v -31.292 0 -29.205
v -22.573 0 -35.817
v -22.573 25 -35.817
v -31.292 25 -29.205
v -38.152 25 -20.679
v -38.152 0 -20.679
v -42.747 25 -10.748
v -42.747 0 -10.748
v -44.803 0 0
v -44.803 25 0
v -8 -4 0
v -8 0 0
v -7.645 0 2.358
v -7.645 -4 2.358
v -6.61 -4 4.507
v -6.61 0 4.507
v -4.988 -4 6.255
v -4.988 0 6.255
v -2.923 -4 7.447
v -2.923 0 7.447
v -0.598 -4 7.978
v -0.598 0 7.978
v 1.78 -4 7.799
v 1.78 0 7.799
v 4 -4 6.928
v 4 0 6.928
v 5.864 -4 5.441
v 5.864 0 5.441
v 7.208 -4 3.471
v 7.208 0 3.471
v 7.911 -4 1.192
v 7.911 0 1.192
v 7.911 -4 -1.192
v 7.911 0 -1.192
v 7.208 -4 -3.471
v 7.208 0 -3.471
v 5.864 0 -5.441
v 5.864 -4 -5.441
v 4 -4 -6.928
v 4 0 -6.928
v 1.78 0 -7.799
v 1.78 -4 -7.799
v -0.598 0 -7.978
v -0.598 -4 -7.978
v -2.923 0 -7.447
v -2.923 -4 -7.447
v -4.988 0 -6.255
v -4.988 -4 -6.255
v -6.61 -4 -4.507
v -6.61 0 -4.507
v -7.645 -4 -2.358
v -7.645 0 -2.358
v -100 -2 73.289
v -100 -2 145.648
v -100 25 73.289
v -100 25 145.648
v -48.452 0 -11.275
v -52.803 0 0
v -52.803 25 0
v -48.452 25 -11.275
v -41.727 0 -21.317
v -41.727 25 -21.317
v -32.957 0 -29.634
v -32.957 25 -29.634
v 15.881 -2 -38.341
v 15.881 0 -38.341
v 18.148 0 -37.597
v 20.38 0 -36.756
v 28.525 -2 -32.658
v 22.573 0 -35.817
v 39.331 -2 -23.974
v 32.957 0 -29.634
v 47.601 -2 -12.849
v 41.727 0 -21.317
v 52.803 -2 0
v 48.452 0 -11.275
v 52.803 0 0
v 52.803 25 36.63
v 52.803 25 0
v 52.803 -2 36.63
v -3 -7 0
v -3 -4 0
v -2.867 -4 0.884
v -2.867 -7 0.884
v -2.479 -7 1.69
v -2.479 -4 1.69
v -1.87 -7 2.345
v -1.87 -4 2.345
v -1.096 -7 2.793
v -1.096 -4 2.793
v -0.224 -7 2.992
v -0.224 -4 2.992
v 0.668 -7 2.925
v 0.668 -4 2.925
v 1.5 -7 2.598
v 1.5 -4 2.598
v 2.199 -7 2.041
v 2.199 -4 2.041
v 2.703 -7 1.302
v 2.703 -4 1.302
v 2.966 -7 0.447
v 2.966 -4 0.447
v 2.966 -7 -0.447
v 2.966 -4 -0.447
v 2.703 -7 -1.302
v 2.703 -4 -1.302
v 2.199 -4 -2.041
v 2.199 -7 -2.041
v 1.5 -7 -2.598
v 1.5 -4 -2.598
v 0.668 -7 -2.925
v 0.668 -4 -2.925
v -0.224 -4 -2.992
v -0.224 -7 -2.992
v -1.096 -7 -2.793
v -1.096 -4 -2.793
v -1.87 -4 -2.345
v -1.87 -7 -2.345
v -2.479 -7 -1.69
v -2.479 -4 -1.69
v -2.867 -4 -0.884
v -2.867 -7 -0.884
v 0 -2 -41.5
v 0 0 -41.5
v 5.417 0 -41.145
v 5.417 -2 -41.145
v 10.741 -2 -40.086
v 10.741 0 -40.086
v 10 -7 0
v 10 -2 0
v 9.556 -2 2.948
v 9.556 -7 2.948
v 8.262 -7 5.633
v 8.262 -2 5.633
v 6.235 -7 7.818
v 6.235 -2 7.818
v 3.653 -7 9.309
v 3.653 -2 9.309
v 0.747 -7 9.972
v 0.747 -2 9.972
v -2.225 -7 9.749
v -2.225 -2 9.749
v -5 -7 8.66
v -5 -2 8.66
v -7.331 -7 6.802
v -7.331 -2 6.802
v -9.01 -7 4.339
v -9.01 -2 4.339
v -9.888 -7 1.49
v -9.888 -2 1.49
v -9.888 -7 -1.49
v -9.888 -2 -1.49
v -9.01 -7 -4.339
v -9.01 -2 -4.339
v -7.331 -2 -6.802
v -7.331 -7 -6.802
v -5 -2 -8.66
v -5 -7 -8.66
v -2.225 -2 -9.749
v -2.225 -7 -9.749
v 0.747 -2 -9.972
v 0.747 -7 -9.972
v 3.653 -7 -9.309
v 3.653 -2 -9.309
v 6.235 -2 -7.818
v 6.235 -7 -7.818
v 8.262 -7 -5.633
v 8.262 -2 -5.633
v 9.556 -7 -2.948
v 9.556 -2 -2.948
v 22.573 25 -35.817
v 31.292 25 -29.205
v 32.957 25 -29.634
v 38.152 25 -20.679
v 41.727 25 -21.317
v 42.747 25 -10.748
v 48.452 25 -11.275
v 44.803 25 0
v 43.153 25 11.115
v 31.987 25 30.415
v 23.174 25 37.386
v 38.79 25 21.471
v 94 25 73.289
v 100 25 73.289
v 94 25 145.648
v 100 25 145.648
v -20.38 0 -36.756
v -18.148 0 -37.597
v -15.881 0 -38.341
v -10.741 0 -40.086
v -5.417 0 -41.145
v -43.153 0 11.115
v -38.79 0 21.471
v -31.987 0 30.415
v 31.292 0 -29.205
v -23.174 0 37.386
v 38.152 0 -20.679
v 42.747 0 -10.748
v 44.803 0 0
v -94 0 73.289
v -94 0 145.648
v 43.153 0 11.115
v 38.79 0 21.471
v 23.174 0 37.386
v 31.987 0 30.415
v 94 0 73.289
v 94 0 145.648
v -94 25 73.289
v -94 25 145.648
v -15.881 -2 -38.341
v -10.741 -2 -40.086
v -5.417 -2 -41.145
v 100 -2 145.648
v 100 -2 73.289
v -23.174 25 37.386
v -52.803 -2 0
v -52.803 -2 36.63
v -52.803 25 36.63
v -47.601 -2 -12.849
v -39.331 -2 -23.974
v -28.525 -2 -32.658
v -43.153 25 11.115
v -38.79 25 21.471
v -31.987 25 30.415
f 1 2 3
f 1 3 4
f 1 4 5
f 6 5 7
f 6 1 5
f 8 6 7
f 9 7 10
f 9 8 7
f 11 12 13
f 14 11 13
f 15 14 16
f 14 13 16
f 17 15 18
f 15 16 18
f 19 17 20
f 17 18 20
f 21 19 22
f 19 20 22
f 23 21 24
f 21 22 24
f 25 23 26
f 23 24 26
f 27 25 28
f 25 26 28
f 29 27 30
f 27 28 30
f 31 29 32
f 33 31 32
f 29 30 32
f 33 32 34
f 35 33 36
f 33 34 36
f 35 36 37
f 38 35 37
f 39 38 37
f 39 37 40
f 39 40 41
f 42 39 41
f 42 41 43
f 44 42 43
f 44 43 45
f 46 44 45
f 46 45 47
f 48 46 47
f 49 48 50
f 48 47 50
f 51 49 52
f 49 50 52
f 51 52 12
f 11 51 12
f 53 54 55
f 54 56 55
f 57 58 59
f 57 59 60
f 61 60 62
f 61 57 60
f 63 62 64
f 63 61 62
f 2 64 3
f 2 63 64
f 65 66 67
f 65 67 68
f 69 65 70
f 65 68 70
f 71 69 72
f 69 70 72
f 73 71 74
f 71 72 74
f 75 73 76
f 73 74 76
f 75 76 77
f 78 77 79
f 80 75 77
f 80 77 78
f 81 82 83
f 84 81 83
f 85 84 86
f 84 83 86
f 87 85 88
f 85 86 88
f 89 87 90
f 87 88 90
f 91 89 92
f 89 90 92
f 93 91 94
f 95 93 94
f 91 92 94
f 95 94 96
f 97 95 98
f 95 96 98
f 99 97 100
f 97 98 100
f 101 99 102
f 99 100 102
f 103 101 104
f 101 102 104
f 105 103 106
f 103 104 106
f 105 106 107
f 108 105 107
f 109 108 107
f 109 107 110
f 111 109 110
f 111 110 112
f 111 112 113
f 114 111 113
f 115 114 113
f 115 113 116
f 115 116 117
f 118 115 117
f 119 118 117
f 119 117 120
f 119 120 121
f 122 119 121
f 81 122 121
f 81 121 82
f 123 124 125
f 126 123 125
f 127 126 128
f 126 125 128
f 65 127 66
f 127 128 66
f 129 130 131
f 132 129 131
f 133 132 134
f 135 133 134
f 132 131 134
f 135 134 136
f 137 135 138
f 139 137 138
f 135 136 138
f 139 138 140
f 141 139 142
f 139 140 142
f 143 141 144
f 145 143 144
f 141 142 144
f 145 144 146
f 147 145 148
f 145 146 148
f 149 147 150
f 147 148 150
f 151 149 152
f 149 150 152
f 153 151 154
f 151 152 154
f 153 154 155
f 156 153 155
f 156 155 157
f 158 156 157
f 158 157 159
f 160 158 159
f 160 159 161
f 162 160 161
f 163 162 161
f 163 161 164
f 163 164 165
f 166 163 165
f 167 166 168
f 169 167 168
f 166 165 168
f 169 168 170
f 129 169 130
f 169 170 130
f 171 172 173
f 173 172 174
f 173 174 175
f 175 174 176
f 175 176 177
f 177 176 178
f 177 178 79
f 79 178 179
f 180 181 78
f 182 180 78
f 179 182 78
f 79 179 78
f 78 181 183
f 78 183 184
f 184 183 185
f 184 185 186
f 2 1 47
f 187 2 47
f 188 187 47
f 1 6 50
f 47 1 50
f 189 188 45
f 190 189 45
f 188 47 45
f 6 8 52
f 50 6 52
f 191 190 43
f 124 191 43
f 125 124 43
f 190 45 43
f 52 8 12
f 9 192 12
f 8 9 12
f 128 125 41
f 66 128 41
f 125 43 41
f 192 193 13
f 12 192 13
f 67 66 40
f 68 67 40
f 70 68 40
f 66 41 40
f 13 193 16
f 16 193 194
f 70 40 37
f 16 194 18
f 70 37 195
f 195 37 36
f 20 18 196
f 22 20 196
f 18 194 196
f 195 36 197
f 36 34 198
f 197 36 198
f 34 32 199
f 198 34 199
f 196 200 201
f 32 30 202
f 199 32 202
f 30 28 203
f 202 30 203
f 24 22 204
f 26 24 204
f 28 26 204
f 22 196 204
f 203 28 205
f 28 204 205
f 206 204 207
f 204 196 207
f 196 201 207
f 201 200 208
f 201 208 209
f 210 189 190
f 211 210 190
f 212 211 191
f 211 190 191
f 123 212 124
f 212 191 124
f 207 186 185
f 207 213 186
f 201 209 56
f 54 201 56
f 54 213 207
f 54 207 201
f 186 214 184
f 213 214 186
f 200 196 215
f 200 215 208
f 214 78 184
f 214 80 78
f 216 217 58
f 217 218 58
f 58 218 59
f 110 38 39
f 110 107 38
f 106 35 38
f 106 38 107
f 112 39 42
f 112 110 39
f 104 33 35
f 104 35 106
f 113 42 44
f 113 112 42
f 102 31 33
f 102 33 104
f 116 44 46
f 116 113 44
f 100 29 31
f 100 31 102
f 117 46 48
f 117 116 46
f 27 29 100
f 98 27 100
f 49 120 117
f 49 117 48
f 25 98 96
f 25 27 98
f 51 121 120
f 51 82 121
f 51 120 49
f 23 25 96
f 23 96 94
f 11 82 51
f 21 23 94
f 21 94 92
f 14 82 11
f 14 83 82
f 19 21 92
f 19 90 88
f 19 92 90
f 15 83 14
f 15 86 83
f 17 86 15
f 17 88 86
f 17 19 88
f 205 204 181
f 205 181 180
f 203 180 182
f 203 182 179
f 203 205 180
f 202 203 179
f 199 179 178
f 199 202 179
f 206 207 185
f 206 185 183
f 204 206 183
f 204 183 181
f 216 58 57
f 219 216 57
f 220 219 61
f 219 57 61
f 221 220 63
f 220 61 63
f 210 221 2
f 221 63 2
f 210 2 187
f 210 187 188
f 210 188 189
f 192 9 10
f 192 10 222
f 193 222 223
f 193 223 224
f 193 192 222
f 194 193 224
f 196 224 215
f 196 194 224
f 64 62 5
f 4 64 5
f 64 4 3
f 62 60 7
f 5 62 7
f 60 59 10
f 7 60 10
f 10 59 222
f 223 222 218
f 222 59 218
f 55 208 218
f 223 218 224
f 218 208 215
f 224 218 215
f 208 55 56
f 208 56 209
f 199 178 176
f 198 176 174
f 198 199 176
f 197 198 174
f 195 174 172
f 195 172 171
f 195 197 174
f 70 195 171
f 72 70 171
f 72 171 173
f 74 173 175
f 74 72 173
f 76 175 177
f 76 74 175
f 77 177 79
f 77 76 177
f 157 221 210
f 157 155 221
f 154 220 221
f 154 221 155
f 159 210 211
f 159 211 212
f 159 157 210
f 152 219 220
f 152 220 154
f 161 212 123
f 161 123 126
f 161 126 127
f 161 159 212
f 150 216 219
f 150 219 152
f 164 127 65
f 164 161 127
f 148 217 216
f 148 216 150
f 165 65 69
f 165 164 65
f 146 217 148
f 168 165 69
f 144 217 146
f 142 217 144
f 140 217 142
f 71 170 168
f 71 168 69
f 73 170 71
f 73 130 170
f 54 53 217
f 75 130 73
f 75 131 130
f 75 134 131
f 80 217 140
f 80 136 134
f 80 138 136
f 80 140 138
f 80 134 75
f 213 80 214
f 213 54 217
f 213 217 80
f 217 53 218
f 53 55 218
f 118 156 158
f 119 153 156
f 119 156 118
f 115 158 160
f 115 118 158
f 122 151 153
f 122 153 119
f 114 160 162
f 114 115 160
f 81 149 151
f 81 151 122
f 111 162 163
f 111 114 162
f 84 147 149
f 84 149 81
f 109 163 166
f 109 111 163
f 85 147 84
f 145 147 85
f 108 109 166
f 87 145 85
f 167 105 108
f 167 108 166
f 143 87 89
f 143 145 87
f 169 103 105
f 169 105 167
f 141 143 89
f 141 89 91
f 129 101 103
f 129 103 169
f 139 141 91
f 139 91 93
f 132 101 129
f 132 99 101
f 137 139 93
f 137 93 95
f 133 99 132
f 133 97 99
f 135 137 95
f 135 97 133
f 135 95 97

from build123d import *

# Parameters (mm, degrees)
F1_DEPTH  = 2
F2_R      = 10
F3_DEPTH  = 5
F4_R      = 8
F5_DEPTH  = 4
F6_R      = 3
F7_DEPTH  = 25
F9_DEPTH  = 25
F11_DEPTH = 25
F12_DEPTH = 25


# Not quite as in the source:
# - a feature names something its author has since deleted; it is built from what else it names


with BuildPart() as f1:
    # F0 (on Front) → F1 (new body)
    with BuildSketch(Plane.XZ):
        with BuildLine():
            Line((0, 0), (15.8813624432, -38.3410005992))
            ThreePointArc((15.8813624432, -38.3410005992), (41.5, 0), (15.8813624432, 38.3410005992))
            Line((15.8813624432, 38.3410005992), (0, 0))
        make_face()
        with BuildLine():
            ThreePointArc((0, -41.5), (8.0962483637, -40.7025891367), (15.8813624432, -38.3410005992))
            Line((15.8813624432, -38.3410005992), (0, 0))
            Line((0, 0), (0, -41.5))
        make_face()
        with BuildLine():
            ThreePointArc((15.8813624432, 38.3410005992), (41.5, 0), (15.8813624432, -38.3410005992))
            ThreePointArc((15.8813624432, -38.3410005992), (39.330613444, -23.9742260076), (52.803106606, 0))
            Line((52.803106606, 0), (52.803106606, 36.6300418973))
            Line((52.803106606, 36.6300418973), (100, 73.2887908816))
            Line((100, 73.2887908816), (100, 145.6475704908))
            Line((100, 145.6475704908), (0, 145.6475704908))
            Line((0, 145.6475704908), (-100, 145.6475704908))
            Line((-100, 145.6475704908), (-100, 73.2887908816))
            Line((-100, 73.2887908816), (-52.803106606, 36.6300418973))
            Line((-52.803106606, 36.6300418973), (-52.803106606, 0))
            ThreePointArc((-52.803106606, 0), (-39.330613444, -23.9742260076), (-15.8813624432, -38.3410005992))
            ThreePointArc((-15.8813624432, -38.3410005992), (-41.5, 0), (-15.8813624432, 38.3410005992))
            ThreePointArc((-15.8813624432, 38.3410005992), (0, 41.5), (15.8813624432, 38.3410005992))
        make_face()
        with BuildLine():
            Line((0, -41.5), (0, 0))
            Line((0, 0), (-15.8813624432, -38.3410005992))
            ThreePointArc((-15.8813624432, -38.3410005992), (-8.0962483637, -40.7025891367), (0, -41.5))
        make_face()
        with BuildLine():
            Line((-15.8813624432, -38.3410005992), (0, 0))
            Line((0, 0), (-15.8813624432, 38.3410005992))
            ThreePointArc((-15.8813624432, 38.3410005992), (-41.5, 0), (-15.8813624432, -38.3410005992))
        make_face()
        with BuildLine():
            Line((0, 0), (15.8813624432, 38.3410005992))
            ThreePointArc((15.8813624432, 38.3410005992), (0, 41.5), (-15.8813624432, 38.3410005992))
            Line((-15.8813624432, 38.3410005992), (0, 0))
        make_face()
    extrude(amount=F1_DEPTH)

    # F2 (on face) → F3 (join)
    with BuildSketch(Plane.XZ.offset(2)):
        Circle(F2_R)
    extrude(amount=F3_DEPTH)

    # F4 (on face) → F5 (cut)
    with BuildSketch(Plane(origin=(0, 0, 0), x_dir=(-1, 0, 0), z_dir=(0, 1, 0))):
        Circle(F4_R)
    extrude(amount=-F5_DEPTH, mode=Mode.SUBTRACT)

    # F6 (on face) → F7 (cut)
    with BuildSketch(Plane(origin=(0, 0, 0), x_dir=(-1, 0, 0), z_dir=(0, 1, 0))):
        Circle(F6_R)
    extrude(amount=-F7_DEPTH, mode=Mode.SUBTRACT)

    # F8 (on face) → F9 (join)
    with BuildSketch(Plane.XZ):
        with BuildLine():
            Line((100, 145.6475704908), (94, 145.6475704908))
            Line((94, 145.6475704908), (94, 73.2887908816))
            Line((94, 73.2887908816), (23.1737587601, 37.3859927058))
            ThreePointArc((23.1737587601, 37.3859927058), (38.7897108638, 21.4707349754), (44.803106606, 0))
            Line((44.803106606, 0), (52.803106606, 0))
            Line((52.803106606, 0), (52.803106606, 36.6300418973))
            Line((52.803106606, 36.6300418973), (100, 73.2887908816))
            Line((100, 73.2887908816), (100, 145.6475704908))
        make_face()
        with BuildLine():
            Line((-100, 145.6475704908), (-100, 73.2887908816))
            Line((-100, 73.2887908816), (-52.803106606, 36.6300418973))
            Line((-52.803106606, 36.6300418973), (-52.803106606, 0))
            Line((-52.803106606, 0), (-44.803106606, 0))
            ThreePointArc((-44.803106606, 0), (-38.7897108638, 21.4707349754), (-23.1737587601, 37.3859927058))
            Line((-23.1737587601, 37.3859927058), (-94, 73.2887908816))
            Line((-94, 73.2887908816), (-94, 143.9662277699))
            Line((-94, 143.9662277699), (-94, 145.6475704908))
            Line((-94, 145.6475704908), (-100, 145.6475704908))
        make_face()
    extrude(amount=-F9_DEPTH)

    # F10 (on face) → F11 (join)
    with BuildSketch(Plane.XZ):
        with BuildLine():
            ThreePointArc((44.803106606, 0), (38.1524173859, -20.6793456236), (22.573144677, -35.8171547249))
            ThreePointArc((22.573144677, -35.8171547249), (41.7266336711, -21.3171100871), (52.803106606, 0))
            Line((52.803106606, 0), (44.803106606, 0))
        make_face()
    extrude(amount=-F11_DEPTH)

    # F10 (on face) → F12 (join)
    with BuildSketch(Plane.XZ):
        with BuildLine():
            ThreePointArc((-52.803106606, 0), (-41.7266336711, -21.3171100871), (-22.573144677, -35.8171547249))
            ThreePointArc((-22.573144677, -35.8171547249), (-38.1524173859, -20.6793456236), (-44.803106606, 0))
            Line((-44.803106606, 0), (-52.803106606, 0))
        make_face()
    extrude(amount=-F12_DEPTH)


solid = f1.part
